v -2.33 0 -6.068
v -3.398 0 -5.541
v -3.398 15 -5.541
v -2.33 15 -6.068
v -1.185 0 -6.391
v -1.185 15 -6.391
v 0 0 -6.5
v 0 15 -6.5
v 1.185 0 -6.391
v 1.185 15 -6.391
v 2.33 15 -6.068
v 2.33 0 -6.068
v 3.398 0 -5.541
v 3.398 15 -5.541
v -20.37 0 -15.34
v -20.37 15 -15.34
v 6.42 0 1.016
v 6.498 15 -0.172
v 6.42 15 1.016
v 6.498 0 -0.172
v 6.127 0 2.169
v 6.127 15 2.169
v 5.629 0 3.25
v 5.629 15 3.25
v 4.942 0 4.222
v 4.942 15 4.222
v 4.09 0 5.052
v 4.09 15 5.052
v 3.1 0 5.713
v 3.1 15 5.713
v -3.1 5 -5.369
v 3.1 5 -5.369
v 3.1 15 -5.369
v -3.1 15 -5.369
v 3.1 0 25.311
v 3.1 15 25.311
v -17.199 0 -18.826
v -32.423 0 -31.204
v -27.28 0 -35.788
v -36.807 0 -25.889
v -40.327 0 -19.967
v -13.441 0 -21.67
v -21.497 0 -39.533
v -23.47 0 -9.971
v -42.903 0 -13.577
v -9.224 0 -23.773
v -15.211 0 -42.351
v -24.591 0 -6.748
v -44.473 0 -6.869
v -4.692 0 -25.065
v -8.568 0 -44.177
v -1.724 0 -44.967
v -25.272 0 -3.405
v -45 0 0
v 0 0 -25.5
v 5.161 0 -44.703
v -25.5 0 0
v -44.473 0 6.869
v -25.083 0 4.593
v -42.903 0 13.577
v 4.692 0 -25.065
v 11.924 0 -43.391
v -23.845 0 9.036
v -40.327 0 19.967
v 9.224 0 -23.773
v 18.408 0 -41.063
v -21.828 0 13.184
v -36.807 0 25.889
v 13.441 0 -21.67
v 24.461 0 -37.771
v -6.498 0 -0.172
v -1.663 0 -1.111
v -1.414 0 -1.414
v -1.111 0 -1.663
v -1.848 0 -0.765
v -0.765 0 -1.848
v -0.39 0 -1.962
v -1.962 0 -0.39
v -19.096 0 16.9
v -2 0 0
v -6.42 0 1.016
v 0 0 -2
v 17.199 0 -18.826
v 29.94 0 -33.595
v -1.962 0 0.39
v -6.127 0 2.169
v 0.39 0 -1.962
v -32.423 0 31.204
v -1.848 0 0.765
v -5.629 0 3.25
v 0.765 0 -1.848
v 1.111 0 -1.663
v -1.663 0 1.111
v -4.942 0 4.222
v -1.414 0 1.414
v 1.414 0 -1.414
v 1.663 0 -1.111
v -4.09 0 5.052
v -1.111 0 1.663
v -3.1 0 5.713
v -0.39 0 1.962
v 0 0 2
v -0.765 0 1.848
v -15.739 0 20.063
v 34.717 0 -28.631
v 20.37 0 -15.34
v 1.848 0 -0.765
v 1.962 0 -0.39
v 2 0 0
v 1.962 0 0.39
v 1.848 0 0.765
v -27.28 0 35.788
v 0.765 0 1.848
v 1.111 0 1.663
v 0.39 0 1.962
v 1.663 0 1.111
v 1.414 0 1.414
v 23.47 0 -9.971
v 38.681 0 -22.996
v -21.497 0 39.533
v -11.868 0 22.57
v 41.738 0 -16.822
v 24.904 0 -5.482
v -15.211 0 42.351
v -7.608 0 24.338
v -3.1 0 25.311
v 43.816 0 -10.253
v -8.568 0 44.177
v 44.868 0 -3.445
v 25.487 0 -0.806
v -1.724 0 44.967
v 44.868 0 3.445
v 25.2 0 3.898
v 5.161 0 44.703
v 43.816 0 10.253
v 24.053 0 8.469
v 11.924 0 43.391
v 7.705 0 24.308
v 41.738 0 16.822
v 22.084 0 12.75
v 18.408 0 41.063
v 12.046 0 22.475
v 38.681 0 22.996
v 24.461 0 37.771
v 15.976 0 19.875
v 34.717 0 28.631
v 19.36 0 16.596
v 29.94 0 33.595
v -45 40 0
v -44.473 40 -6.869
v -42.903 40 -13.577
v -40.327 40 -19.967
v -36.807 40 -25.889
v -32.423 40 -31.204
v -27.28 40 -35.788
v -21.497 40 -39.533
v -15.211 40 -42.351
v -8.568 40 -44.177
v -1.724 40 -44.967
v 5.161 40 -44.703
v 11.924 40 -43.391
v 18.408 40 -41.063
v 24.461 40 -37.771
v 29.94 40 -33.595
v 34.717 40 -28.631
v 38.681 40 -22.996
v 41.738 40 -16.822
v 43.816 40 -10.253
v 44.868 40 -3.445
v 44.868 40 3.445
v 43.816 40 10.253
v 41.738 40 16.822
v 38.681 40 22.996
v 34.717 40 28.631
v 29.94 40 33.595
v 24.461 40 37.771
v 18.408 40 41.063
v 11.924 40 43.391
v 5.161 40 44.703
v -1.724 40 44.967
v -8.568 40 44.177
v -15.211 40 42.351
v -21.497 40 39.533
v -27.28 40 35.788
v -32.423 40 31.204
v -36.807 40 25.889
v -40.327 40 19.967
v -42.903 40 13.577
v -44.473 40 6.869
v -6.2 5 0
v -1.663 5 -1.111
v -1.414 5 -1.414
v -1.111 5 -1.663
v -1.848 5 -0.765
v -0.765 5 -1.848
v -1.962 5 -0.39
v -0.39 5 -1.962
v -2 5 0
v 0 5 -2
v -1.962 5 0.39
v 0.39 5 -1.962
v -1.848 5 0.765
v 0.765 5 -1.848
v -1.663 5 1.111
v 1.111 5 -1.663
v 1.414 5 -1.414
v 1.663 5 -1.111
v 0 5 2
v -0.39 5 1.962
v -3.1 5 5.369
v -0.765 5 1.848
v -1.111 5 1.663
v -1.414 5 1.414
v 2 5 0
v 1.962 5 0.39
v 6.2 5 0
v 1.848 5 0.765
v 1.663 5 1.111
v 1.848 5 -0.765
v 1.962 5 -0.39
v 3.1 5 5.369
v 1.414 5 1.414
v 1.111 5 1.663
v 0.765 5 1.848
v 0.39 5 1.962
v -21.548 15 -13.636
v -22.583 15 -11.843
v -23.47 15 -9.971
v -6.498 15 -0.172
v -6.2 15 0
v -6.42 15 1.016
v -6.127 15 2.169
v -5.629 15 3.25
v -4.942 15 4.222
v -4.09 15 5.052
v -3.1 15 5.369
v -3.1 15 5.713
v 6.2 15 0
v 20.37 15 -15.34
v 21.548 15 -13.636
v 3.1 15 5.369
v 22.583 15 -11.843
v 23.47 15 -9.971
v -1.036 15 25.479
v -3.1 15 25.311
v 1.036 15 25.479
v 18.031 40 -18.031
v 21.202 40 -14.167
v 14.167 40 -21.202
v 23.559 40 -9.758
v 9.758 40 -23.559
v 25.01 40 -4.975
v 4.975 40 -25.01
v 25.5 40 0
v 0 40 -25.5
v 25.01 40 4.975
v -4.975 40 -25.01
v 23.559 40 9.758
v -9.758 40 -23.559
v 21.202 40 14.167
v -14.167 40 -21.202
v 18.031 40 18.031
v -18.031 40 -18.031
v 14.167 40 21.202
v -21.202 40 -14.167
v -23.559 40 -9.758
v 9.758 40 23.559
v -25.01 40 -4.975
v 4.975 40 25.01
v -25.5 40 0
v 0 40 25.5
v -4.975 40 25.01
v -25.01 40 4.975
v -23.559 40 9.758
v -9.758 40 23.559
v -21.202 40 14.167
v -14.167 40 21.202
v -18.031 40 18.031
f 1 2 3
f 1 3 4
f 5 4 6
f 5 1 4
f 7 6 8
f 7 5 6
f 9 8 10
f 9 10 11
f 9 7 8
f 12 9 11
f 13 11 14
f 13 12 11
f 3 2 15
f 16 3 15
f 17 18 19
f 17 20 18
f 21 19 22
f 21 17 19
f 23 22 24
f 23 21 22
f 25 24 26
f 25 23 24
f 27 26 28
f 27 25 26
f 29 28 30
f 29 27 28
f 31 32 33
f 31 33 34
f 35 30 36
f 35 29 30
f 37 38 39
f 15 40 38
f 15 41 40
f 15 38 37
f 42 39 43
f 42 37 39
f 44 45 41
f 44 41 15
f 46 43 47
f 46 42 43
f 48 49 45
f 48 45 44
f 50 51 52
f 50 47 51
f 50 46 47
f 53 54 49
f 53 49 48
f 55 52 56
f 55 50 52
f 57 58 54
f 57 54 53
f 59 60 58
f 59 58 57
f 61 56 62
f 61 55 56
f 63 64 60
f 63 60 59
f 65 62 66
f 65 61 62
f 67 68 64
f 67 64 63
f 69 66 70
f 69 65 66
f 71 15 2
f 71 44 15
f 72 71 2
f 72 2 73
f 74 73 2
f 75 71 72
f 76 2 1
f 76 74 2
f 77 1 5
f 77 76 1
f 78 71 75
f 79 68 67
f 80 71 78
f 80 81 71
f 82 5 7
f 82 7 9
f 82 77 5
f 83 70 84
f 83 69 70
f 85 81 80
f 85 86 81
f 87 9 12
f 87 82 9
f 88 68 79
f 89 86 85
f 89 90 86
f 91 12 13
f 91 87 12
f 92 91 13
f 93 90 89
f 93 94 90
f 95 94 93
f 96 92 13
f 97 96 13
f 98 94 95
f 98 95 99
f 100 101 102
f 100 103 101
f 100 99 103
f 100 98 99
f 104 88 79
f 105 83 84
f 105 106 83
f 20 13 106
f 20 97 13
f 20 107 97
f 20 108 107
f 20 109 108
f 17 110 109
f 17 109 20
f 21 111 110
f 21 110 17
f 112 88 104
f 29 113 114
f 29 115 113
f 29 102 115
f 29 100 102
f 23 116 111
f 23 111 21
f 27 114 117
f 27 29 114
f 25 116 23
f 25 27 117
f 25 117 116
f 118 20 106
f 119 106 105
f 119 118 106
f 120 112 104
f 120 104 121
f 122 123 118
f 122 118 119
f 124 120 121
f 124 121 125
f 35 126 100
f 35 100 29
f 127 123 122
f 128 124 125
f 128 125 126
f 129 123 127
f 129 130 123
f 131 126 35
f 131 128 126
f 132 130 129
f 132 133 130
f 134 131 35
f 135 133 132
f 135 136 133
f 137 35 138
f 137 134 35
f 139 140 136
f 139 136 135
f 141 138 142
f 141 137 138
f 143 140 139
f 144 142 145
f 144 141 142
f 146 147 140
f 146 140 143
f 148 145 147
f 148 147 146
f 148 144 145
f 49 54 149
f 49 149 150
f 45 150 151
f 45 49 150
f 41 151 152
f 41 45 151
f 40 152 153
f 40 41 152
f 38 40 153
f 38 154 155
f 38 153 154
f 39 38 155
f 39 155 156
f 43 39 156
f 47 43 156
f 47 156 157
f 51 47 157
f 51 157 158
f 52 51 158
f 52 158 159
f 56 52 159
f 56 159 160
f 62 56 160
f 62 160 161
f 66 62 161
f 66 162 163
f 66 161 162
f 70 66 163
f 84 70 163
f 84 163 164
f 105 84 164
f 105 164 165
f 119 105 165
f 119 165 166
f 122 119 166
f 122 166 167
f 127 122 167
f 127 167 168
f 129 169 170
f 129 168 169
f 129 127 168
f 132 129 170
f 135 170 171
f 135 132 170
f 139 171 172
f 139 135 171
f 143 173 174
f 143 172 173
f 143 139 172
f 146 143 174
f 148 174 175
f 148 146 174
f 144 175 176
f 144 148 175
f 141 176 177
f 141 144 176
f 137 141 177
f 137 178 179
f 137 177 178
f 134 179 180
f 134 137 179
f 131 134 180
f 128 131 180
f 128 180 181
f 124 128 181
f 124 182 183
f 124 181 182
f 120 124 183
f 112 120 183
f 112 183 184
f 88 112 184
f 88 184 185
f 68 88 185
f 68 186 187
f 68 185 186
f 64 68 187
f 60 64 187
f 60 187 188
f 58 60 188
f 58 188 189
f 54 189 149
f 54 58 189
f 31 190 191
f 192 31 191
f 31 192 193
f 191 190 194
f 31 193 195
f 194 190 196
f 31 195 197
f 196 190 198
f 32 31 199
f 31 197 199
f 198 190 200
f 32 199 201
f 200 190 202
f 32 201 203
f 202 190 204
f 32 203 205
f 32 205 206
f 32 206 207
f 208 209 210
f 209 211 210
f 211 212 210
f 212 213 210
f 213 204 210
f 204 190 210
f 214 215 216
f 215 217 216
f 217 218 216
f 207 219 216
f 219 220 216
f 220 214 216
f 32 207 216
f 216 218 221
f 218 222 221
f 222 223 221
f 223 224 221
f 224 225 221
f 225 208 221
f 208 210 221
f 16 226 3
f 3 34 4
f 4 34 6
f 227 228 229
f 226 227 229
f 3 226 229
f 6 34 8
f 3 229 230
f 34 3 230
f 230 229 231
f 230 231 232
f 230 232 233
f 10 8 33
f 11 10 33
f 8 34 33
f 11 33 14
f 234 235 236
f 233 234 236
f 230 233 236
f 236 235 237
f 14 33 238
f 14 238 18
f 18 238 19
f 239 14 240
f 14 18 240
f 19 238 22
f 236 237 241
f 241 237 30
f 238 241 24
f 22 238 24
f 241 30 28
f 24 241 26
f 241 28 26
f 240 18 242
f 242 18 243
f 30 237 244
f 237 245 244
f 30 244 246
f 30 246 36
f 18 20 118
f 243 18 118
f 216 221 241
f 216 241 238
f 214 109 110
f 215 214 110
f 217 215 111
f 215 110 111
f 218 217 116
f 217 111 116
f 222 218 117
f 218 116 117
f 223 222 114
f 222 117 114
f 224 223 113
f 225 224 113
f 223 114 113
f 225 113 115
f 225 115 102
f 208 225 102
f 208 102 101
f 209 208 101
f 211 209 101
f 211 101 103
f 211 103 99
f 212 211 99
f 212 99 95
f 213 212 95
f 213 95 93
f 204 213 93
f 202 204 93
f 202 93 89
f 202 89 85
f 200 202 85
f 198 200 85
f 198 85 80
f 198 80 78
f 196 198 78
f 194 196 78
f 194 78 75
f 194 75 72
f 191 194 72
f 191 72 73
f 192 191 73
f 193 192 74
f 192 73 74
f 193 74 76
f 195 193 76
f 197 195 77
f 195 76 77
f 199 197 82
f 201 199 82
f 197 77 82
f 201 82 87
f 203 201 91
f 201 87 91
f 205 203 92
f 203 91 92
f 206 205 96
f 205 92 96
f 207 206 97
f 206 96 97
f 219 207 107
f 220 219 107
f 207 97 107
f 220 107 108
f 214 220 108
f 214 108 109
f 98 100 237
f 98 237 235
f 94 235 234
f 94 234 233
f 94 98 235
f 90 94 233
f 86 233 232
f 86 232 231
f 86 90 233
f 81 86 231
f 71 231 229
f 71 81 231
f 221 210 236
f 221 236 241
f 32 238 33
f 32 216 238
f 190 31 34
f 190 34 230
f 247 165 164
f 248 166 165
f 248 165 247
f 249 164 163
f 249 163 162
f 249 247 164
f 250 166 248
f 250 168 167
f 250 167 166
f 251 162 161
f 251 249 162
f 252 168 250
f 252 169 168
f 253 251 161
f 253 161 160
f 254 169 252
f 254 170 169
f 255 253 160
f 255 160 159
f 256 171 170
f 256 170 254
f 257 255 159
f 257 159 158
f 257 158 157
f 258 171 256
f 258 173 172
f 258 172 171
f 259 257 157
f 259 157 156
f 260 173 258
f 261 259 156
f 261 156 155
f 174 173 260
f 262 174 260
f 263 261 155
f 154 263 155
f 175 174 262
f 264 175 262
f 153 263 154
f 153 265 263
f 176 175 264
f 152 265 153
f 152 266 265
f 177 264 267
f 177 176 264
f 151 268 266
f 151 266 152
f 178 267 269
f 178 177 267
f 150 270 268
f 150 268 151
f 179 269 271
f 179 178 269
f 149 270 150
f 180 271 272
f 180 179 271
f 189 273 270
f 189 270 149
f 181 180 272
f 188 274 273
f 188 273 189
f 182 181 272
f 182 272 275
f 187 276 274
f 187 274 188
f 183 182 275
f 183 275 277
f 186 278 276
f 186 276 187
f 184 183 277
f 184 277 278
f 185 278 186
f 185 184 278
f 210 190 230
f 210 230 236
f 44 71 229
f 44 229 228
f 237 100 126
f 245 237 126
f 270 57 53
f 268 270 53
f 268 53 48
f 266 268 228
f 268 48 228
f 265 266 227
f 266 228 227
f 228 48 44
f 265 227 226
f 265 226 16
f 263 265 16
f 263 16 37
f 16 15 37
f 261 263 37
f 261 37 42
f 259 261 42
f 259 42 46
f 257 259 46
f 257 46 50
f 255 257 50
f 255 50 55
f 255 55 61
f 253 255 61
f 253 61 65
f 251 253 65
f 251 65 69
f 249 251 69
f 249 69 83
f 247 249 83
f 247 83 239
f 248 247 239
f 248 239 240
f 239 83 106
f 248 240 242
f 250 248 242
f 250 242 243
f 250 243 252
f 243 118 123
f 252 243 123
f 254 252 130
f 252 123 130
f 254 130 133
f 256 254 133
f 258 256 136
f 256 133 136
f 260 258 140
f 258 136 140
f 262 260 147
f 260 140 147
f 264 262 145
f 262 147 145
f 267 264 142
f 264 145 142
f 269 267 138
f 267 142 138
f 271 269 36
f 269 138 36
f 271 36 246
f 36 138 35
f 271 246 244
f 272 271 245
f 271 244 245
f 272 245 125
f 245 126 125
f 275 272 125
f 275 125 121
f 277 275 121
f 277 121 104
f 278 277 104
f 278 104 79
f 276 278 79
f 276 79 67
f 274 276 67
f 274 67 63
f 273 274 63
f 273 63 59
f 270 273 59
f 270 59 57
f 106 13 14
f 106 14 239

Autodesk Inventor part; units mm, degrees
ref_plane "YZ Plane" through (0, 0, 0) normal (1, 0, 0) x (0, 1, 0)
ref_plane "XZ Plane" through (0, 0, 0) normal (0, 1, 0) x (-1, 0, 0)
ref_plane "XY Plane" through (0, 0, 0) normal (0, 0, 1) x (1, 0, 0)
sketch "Sketch1" plane through (0, 0, 0) normal (0, 1, 0) x (-1, 0, 0)
  circle A0 centre (0, 0) radius 45
  circle A1 centre (0, 0) radius 25.5
  dimension "d0" = 90
  dimension "d1" = 51
extrude "Extrusion1" add sketch "Sketch1" along normal blind 40
sketch "Sketch2" plane through (0, 0, 0) normal (0, -1, 0) x (1, 0, 0)
  circle A0 centre (0, 0) radius 25.5 projected
  circle A1 centre (0, 0) radius 45 projected
  line L0 (6.2, 0) -> (3.1, -5.3694)
  line L1 (3.1, -5.3694) -> (-3.1, -5.3694)
  line L2 (-3.1, -5.3694) -> (-6.2, 0)
  line L3 (-6.2, 0) -> (-3.1, 5.3694)
  line L4 (-3.1, 5.3694) -> (3.1, 5.3694)
  line L5 (3.1, 5.3694) -> (6.2, 0)
  line L6 (-3.1, 5.3694) -> (-3.1, 25.3109)
  line L7 (3.1, 5.3694) -> (3.1, 25.3109)
  line L8 (6.2, 0) -> (23.4699, -9.9708)
  line L9 (3.1, -5.3694) -> (20.3699, -15.3401)
  line L10 (-3.1, -5.3694) -> (-20.3699, -15.3401)
  line L11 (-6.2, 0) -> (-23.4699, -9.9708)
  circle A2 centre (0, 0) radius 6.5
  dimension "d4" = 6.2
  dimension "d5" = 13
extrude "Extrusion2" add sketch "Sketch2" against normal blind 15 contours L7 A2 L6 A0 | A0 L9 A2 L8 | A2 L8 L5 L7 | L7 L4 L6 A2 | A2 L9 L0 L8 | L11 A2 L10 A0 | L6 L3 L11 A2 | A2 L10 L1 L9 | L11 L2 L10 A2
sketch "Sketch3" plane through (0, 0, 0) normal (0, -1, 0) x (1, 0, 0)
  line L0 (3.1, -5.3694) -> (-3.1, -5.3694) projected
  line L1 (-3.1, -5.3694) -> (-6.2, 0) projected
  line L2 (-6.2, 0) -> (-3.1, 5.3694) projected
  line L3 (-3.1, 5.3694) -> (3.1, 5.3694) projected
  line L4 (3.1, 5.3694) -> (6.2, 0) projected
  line L5 (6.2, 0) -> (3.1, -5.3694) projected
  circle A0 centre (0, 0) radius 45 projected
  circle A1 centre (0, 0) radius 2
  dimension "d8" = 4
extrude "Extrusion3" add sketch "Sketch3" against normal blind 5 contours L0 L1 L2 L3 L4 L5
properties part number "koleso" material "ABS Plastic"
